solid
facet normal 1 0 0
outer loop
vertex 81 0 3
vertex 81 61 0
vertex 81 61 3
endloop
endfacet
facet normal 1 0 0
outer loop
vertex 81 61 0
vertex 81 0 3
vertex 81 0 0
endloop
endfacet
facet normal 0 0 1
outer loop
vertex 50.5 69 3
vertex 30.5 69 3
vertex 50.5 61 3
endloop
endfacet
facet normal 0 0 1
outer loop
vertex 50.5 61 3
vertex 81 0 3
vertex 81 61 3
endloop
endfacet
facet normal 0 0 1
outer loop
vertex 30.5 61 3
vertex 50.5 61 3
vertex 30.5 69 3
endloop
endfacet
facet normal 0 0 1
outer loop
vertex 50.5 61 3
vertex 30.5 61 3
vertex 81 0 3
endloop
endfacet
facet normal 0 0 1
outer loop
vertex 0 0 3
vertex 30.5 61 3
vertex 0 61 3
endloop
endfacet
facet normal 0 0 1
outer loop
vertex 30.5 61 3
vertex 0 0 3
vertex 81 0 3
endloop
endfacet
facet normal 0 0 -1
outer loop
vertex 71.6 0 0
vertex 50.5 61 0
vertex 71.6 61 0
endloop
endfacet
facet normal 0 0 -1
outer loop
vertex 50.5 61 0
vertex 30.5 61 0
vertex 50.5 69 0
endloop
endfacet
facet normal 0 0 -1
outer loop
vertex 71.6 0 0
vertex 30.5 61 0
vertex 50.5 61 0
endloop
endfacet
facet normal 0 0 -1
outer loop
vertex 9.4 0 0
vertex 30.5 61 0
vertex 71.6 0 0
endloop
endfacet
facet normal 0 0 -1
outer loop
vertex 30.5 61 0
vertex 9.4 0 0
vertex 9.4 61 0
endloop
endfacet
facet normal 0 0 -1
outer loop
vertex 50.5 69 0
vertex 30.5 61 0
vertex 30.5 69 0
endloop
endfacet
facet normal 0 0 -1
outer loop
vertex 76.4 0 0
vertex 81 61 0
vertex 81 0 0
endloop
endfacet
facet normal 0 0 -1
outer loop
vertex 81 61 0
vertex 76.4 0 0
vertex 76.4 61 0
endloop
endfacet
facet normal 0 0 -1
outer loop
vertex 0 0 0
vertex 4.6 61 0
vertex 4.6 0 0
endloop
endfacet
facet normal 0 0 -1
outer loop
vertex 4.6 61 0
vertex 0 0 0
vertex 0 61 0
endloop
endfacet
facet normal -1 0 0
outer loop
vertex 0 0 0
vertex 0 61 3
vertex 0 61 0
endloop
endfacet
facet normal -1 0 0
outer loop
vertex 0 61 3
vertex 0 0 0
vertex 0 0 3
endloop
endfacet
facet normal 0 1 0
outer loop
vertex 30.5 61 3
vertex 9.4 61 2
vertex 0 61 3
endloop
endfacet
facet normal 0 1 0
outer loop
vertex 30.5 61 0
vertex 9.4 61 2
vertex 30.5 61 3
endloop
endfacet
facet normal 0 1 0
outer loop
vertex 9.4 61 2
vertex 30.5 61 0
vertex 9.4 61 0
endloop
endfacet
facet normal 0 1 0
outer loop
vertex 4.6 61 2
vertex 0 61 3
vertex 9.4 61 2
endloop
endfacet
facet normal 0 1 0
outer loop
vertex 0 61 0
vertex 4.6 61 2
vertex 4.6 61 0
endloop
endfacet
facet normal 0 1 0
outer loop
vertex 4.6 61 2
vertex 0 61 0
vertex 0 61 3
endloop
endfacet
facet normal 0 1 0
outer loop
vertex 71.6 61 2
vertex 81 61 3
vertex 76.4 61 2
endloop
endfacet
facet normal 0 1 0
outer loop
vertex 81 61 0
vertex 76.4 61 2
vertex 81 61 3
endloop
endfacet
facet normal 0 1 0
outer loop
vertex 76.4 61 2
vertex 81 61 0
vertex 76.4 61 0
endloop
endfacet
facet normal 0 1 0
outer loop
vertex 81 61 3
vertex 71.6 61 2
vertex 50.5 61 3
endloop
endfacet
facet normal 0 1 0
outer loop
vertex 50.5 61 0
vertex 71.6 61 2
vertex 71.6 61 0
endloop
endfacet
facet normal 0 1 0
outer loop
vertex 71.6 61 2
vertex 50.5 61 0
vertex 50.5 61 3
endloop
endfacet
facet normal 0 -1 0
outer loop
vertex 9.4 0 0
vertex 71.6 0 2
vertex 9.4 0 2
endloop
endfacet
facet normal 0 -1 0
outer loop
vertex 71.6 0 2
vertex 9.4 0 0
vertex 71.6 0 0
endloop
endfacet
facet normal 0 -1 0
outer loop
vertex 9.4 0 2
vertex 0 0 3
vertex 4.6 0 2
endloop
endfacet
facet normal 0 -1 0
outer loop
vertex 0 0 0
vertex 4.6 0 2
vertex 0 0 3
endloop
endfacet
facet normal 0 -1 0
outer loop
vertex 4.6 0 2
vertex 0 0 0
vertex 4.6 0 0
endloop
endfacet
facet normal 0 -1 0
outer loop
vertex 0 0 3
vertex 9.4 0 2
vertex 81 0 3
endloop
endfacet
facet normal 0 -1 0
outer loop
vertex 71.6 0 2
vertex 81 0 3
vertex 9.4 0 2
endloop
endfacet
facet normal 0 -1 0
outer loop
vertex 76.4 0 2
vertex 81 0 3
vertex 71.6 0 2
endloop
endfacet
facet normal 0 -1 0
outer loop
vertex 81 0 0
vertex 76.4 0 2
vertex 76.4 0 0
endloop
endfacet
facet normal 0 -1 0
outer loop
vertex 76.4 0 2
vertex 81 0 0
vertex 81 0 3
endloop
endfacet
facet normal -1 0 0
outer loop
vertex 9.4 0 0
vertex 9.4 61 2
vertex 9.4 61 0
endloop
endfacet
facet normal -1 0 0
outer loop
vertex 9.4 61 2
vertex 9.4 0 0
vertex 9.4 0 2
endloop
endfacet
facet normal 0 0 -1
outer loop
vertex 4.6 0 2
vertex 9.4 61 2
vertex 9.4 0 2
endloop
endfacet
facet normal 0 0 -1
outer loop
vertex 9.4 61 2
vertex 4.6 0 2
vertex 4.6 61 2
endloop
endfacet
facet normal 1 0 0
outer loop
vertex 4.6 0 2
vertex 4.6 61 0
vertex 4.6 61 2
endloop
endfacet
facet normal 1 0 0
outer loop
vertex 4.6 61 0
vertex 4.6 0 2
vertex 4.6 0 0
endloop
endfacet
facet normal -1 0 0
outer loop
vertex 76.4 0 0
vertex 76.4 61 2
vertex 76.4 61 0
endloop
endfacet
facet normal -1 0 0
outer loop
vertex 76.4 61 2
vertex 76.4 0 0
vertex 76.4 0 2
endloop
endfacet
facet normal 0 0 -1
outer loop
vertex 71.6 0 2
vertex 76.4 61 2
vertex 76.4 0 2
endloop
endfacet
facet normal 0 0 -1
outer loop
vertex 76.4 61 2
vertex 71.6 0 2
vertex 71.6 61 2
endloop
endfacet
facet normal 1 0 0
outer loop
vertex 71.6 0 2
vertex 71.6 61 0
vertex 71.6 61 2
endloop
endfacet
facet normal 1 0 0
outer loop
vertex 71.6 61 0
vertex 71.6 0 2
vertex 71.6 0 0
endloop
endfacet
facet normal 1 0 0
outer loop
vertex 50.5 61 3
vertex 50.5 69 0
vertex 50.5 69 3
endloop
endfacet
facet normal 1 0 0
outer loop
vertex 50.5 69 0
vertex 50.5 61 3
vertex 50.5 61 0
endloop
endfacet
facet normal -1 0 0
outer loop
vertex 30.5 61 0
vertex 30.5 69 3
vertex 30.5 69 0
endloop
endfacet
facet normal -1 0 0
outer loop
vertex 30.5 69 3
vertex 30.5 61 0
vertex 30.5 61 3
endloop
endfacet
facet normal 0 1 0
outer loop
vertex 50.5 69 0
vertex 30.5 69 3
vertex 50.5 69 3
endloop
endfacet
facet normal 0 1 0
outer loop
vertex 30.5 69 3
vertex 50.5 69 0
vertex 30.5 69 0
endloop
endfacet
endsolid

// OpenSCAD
// ==========================================
// SLIDING LID
// Matched to transformer_box.scad
// All dimensions in mm
// ==========================================

$fn = 64;


// ==========================================
// DIMENSIONS
// ==========================================

box_w = 82;
box_d = 62;

lid_thickness = 3;

clearance = 0.4;

rail_width = 4;
rail_height = 2;


// ==========================================
// LID SIZE
// ==========================================

lid_w = box_w - 1;
lid_d = box_d - 1;


// ==========================================
// LID WITH SIDE GROOVES
// ==========================================

difference() {

    // Main lid
    cube([
        lid_w,
        lid_d,
        lid_thickness
    ]);


    // ======================================
    // LEFT GROOVE
    // ======================================

    translate([
        5 - clearance,
        -1,
        -0.01
    ])
    cube([
        rail_width + clearance*2,
        lid_d + 2,
        rail_height + 0.01
    ]);


    // ======================================
    // RIGHT GROOVE
    // ======================================

    translate([
        lid_w - 5 - rail_width - clearance,
        -1,
        -0.01
    ])
    cube([
        rail_width + clearance*2,
        lid_d + 2,
        rail_height + 0.01
    ]);
}


// ==========================================
// PULL TAB
// ==========================================

translate([
    (lid_w - 20)/2,
    lid_d,
    0
])
cube([
    20,
    8,
    lid_thickness
]);
